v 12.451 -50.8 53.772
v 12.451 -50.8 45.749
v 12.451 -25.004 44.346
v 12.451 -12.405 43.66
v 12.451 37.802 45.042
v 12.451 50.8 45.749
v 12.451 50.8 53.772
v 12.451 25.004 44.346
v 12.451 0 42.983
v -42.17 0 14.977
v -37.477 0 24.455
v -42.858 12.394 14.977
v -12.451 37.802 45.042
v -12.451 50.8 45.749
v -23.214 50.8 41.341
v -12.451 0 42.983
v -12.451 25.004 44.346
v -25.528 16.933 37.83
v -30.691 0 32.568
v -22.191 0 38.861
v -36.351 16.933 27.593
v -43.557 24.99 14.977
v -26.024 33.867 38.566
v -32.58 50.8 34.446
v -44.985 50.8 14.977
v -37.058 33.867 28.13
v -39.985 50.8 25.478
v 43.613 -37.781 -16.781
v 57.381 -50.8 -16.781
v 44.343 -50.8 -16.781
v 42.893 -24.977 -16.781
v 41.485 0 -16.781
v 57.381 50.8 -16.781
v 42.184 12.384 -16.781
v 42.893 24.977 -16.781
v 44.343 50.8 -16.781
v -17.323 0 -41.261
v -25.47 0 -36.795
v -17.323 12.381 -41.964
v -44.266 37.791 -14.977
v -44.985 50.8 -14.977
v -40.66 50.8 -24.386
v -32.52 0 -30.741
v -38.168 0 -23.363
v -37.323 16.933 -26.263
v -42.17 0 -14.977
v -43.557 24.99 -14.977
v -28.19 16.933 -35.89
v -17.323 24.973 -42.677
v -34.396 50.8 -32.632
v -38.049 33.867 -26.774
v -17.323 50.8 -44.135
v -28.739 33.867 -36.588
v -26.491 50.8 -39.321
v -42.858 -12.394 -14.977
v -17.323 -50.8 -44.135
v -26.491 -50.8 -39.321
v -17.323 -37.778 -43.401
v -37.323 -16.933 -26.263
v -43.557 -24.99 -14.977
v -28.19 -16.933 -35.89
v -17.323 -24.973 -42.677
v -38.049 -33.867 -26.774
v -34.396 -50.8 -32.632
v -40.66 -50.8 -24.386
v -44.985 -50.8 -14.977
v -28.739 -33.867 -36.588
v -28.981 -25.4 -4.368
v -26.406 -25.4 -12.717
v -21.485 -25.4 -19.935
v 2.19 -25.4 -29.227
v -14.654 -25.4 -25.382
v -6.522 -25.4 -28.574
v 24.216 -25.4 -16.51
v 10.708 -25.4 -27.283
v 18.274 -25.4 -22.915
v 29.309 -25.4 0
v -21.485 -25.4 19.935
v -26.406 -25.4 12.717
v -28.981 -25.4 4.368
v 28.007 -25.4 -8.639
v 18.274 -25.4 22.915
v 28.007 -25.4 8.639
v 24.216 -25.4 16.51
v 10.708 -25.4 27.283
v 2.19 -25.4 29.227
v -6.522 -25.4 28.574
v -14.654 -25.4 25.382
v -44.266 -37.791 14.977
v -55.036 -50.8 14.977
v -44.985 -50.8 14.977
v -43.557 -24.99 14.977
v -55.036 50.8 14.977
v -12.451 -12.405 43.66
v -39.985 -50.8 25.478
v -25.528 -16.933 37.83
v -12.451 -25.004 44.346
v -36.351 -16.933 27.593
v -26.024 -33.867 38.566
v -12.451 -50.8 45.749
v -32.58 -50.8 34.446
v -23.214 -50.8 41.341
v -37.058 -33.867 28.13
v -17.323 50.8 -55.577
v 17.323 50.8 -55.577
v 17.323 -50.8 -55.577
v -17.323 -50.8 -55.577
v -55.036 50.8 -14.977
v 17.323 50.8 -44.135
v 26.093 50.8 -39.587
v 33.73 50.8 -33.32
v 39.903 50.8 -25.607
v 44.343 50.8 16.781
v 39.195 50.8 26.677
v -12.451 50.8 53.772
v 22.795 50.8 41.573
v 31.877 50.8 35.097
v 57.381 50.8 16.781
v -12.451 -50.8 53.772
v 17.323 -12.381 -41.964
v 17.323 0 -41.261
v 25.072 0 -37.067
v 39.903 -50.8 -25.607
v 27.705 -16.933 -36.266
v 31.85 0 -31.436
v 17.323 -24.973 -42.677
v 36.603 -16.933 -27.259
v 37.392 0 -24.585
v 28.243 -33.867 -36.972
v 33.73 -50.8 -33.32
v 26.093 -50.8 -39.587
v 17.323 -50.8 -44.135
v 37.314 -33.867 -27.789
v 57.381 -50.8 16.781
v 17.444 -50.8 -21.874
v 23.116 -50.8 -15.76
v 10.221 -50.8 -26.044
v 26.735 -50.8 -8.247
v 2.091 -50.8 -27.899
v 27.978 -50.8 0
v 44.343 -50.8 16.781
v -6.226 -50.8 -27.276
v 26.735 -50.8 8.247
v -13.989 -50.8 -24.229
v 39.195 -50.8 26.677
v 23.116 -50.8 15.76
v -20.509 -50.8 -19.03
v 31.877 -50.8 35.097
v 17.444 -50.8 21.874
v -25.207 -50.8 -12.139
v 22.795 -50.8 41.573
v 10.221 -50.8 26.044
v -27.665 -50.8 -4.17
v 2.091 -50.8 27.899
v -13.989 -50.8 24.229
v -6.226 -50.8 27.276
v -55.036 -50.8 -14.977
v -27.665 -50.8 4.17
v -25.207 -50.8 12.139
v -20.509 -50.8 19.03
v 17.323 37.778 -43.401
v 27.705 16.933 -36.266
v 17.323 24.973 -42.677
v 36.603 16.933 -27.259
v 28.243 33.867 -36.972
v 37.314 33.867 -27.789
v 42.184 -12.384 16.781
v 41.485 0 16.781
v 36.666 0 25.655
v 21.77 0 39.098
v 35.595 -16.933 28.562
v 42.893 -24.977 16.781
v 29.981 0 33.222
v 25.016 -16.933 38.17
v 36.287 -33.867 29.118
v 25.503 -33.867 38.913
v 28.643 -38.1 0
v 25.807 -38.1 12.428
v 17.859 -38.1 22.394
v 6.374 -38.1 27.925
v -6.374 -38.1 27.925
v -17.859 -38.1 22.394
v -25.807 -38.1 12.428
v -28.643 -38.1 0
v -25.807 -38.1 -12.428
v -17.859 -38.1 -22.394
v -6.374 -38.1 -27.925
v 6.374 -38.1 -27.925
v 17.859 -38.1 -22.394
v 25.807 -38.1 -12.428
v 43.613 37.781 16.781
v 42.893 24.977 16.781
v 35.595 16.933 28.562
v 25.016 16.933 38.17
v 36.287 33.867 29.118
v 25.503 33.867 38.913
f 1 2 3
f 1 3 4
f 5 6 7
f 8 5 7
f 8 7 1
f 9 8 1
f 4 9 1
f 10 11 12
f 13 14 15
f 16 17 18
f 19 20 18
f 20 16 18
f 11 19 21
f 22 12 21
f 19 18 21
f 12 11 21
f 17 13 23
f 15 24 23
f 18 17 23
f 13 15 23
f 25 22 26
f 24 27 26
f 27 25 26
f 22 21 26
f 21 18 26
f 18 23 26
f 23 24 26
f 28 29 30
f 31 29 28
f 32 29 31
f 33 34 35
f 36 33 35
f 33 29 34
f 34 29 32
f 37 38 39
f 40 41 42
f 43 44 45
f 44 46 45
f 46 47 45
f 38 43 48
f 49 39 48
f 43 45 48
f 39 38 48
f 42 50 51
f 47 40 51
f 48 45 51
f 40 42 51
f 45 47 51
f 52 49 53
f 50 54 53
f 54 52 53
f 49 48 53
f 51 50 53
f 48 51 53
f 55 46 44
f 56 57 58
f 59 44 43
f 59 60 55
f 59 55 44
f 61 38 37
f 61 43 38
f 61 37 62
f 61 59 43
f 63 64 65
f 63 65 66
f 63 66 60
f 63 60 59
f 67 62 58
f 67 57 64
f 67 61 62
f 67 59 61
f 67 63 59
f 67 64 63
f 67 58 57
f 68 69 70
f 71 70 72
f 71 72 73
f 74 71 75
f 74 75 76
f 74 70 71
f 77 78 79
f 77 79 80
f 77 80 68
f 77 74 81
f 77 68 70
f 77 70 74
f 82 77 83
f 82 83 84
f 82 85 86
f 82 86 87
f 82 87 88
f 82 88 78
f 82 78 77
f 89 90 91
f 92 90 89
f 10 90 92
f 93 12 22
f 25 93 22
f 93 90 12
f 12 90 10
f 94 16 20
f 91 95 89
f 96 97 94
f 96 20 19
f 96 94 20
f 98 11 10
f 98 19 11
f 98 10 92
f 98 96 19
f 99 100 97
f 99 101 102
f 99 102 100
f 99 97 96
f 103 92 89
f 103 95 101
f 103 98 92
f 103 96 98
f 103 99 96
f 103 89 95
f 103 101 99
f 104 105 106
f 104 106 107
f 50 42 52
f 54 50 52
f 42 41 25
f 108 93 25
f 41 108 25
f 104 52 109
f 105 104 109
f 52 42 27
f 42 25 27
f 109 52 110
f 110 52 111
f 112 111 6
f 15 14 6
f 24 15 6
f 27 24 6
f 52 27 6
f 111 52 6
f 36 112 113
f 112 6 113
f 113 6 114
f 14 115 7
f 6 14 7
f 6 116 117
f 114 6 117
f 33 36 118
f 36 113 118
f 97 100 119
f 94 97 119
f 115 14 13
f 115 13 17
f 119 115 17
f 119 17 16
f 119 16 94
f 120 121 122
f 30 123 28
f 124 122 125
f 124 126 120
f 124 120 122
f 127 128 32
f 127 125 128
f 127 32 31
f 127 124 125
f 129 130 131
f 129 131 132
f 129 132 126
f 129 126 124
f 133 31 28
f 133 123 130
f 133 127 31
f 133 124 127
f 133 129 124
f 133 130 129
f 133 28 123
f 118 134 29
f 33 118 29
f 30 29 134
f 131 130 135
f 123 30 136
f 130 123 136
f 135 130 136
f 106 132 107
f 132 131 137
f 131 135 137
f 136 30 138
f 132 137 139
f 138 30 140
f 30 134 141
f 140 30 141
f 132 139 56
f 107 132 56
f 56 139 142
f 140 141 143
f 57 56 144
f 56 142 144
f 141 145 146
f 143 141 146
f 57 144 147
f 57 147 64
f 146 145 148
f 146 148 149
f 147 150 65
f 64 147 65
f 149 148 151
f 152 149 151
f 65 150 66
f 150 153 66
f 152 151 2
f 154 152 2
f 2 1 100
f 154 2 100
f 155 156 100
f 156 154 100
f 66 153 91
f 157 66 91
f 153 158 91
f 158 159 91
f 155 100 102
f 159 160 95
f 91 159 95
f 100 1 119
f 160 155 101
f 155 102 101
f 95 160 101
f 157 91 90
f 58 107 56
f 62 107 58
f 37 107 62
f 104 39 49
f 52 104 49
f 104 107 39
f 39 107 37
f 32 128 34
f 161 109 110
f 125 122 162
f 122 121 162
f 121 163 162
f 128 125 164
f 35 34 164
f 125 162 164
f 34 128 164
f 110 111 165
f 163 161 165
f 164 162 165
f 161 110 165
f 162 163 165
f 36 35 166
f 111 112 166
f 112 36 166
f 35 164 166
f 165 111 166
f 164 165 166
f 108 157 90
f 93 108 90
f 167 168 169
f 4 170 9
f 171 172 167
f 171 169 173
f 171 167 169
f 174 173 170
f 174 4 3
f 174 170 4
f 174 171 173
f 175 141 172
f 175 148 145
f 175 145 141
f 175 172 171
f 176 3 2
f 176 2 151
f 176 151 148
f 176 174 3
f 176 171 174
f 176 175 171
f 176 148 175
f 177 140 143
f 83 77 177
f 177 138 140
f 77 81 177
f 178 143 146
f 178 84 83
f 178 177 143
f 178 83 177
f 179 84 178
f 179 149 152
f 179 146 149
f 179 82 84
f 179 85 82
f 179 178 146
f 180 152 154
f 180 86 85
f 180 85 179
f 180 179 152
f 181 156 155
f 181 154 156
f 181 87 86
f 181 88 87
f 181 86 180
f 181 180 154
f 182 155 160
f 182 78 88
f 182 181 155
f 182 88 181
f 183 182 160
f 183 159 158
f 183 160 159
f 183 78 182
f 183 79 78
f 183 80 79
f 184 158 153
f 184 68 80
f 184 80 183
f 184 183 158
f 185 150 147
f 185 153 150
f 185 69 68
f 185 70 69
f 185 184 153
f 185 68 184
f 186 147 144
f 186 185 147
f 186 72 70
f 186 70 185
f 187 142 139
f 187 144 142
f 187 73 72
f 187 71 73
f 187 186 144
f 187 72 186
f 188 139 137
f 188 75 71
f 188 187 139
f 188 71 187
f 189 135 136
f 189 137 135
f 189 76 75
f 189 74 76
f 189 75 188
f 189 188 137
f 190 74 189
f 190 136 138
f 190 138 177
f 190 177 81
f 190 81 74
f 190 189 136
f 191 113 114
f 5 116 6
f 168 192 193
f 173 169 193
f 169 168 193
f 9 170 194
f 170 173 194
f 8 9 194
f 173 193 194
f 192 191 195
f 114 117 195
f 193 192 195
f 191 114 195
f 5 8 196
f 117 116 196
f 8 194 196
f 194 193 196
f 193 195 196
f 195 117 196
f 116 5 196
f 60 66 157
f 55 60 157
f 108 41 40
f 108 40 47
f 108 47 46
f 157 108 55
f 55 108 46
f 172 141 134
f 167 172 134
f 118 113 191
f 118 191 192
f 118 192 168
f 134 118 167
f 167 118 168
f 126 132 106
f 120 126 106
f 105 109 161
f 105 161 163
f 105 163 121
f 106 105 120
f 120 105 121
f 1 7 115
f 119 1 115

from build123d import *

# Parameters (mm, degrees)
F0_R     = 44.7502434254
F1_DEPTH = 50.8
F1_TAPER = -3
F2_W     = 24.901330471
F2_H     = 27.4275690317
F2_W_2   = 37.1715724468
F2_H_2   = 29.9537181854
F2_W_3   = 11.5484520793
F2_H_3   = 1.9849091768
F3_DEPTH = 101.6
F4_R     = 27.9776430022
F5_DEPTH = 25.4
F5_TAPER = -3


with BuildPart() as f1:
    # F0 (on Front) → F1 (new body, symmetric)
    with BuildSketch(Plane.XZ):
        Circle(F0_R)
    extrude(amount=F1_DEPTH, both=True, taper=F1_TAPER)

    # F2 (on face) → F3 (join)
    with BuildSketch(Plane(origin=(0, 50.8, 0), x_dir=(-1, 0, 0), z_dir=(0, 1, 0))):
        with BuildLine():
            ThreePointArc((47.412558613, 0), (46.8017179006, 7.5861660792), (44.9849353222, 14.9768590927))
            Line((44.9849353222, 14.9768590927), (17.8640037775, 14.9768590927))
            Line((17.8640037775, 14.9768590927), (17.8640037775, -14.9768590927))
            Line((17.8640037775, -14.9768590927), (44.9849353222, -14.9768590927))
            ThreePointArc((44.9849353222, -14.9768590927), (46.8017179006, -7.5861660792), (47.412558613, 0))
        make_face()
        with Locations((0, 40.0586426258)):
            Rectangle(F2_W, F2_H)
        with Locations((36.4497900009, 0)):
            Rectangle(F2_W_2, F2_H_2)
        Polygon((-17.3226743937, -55.5769503117), (17.3226743937, -55.5769503117), (17.3226743937, -14.7964656353), (-5.7742223144, -14.7964656353), (-5.7742223144, -16.7813748121), (-17.3226743937, -16.7813748121), align=None)
        Polygon((-57.3813542724, -16.7813748121), (-17.3226743937, -16.7813748121), (-17.3226743937, -14.7964656353), (-5.7742223144, -14.7964656353), (-5.7742223144, 16.7813748121), (-57.3813542724, 16.7813748121), align=None)
        with Locations((-11.548448354, -15.7889202237)):
            Rectangle(F2_W_3, F2_H_3)
    extrude(amount=-F3_DEPTH)

    # F4 (on face) → F5 (cut)
    with BuildSketch(Plane.XZ.offset(50.8)):
        Circle(F4_R)
    extrude(amount=-F5_DEPTH, taper=F5_TAPER, mode=Mode.SUBTRACT)


solid = f1.part
